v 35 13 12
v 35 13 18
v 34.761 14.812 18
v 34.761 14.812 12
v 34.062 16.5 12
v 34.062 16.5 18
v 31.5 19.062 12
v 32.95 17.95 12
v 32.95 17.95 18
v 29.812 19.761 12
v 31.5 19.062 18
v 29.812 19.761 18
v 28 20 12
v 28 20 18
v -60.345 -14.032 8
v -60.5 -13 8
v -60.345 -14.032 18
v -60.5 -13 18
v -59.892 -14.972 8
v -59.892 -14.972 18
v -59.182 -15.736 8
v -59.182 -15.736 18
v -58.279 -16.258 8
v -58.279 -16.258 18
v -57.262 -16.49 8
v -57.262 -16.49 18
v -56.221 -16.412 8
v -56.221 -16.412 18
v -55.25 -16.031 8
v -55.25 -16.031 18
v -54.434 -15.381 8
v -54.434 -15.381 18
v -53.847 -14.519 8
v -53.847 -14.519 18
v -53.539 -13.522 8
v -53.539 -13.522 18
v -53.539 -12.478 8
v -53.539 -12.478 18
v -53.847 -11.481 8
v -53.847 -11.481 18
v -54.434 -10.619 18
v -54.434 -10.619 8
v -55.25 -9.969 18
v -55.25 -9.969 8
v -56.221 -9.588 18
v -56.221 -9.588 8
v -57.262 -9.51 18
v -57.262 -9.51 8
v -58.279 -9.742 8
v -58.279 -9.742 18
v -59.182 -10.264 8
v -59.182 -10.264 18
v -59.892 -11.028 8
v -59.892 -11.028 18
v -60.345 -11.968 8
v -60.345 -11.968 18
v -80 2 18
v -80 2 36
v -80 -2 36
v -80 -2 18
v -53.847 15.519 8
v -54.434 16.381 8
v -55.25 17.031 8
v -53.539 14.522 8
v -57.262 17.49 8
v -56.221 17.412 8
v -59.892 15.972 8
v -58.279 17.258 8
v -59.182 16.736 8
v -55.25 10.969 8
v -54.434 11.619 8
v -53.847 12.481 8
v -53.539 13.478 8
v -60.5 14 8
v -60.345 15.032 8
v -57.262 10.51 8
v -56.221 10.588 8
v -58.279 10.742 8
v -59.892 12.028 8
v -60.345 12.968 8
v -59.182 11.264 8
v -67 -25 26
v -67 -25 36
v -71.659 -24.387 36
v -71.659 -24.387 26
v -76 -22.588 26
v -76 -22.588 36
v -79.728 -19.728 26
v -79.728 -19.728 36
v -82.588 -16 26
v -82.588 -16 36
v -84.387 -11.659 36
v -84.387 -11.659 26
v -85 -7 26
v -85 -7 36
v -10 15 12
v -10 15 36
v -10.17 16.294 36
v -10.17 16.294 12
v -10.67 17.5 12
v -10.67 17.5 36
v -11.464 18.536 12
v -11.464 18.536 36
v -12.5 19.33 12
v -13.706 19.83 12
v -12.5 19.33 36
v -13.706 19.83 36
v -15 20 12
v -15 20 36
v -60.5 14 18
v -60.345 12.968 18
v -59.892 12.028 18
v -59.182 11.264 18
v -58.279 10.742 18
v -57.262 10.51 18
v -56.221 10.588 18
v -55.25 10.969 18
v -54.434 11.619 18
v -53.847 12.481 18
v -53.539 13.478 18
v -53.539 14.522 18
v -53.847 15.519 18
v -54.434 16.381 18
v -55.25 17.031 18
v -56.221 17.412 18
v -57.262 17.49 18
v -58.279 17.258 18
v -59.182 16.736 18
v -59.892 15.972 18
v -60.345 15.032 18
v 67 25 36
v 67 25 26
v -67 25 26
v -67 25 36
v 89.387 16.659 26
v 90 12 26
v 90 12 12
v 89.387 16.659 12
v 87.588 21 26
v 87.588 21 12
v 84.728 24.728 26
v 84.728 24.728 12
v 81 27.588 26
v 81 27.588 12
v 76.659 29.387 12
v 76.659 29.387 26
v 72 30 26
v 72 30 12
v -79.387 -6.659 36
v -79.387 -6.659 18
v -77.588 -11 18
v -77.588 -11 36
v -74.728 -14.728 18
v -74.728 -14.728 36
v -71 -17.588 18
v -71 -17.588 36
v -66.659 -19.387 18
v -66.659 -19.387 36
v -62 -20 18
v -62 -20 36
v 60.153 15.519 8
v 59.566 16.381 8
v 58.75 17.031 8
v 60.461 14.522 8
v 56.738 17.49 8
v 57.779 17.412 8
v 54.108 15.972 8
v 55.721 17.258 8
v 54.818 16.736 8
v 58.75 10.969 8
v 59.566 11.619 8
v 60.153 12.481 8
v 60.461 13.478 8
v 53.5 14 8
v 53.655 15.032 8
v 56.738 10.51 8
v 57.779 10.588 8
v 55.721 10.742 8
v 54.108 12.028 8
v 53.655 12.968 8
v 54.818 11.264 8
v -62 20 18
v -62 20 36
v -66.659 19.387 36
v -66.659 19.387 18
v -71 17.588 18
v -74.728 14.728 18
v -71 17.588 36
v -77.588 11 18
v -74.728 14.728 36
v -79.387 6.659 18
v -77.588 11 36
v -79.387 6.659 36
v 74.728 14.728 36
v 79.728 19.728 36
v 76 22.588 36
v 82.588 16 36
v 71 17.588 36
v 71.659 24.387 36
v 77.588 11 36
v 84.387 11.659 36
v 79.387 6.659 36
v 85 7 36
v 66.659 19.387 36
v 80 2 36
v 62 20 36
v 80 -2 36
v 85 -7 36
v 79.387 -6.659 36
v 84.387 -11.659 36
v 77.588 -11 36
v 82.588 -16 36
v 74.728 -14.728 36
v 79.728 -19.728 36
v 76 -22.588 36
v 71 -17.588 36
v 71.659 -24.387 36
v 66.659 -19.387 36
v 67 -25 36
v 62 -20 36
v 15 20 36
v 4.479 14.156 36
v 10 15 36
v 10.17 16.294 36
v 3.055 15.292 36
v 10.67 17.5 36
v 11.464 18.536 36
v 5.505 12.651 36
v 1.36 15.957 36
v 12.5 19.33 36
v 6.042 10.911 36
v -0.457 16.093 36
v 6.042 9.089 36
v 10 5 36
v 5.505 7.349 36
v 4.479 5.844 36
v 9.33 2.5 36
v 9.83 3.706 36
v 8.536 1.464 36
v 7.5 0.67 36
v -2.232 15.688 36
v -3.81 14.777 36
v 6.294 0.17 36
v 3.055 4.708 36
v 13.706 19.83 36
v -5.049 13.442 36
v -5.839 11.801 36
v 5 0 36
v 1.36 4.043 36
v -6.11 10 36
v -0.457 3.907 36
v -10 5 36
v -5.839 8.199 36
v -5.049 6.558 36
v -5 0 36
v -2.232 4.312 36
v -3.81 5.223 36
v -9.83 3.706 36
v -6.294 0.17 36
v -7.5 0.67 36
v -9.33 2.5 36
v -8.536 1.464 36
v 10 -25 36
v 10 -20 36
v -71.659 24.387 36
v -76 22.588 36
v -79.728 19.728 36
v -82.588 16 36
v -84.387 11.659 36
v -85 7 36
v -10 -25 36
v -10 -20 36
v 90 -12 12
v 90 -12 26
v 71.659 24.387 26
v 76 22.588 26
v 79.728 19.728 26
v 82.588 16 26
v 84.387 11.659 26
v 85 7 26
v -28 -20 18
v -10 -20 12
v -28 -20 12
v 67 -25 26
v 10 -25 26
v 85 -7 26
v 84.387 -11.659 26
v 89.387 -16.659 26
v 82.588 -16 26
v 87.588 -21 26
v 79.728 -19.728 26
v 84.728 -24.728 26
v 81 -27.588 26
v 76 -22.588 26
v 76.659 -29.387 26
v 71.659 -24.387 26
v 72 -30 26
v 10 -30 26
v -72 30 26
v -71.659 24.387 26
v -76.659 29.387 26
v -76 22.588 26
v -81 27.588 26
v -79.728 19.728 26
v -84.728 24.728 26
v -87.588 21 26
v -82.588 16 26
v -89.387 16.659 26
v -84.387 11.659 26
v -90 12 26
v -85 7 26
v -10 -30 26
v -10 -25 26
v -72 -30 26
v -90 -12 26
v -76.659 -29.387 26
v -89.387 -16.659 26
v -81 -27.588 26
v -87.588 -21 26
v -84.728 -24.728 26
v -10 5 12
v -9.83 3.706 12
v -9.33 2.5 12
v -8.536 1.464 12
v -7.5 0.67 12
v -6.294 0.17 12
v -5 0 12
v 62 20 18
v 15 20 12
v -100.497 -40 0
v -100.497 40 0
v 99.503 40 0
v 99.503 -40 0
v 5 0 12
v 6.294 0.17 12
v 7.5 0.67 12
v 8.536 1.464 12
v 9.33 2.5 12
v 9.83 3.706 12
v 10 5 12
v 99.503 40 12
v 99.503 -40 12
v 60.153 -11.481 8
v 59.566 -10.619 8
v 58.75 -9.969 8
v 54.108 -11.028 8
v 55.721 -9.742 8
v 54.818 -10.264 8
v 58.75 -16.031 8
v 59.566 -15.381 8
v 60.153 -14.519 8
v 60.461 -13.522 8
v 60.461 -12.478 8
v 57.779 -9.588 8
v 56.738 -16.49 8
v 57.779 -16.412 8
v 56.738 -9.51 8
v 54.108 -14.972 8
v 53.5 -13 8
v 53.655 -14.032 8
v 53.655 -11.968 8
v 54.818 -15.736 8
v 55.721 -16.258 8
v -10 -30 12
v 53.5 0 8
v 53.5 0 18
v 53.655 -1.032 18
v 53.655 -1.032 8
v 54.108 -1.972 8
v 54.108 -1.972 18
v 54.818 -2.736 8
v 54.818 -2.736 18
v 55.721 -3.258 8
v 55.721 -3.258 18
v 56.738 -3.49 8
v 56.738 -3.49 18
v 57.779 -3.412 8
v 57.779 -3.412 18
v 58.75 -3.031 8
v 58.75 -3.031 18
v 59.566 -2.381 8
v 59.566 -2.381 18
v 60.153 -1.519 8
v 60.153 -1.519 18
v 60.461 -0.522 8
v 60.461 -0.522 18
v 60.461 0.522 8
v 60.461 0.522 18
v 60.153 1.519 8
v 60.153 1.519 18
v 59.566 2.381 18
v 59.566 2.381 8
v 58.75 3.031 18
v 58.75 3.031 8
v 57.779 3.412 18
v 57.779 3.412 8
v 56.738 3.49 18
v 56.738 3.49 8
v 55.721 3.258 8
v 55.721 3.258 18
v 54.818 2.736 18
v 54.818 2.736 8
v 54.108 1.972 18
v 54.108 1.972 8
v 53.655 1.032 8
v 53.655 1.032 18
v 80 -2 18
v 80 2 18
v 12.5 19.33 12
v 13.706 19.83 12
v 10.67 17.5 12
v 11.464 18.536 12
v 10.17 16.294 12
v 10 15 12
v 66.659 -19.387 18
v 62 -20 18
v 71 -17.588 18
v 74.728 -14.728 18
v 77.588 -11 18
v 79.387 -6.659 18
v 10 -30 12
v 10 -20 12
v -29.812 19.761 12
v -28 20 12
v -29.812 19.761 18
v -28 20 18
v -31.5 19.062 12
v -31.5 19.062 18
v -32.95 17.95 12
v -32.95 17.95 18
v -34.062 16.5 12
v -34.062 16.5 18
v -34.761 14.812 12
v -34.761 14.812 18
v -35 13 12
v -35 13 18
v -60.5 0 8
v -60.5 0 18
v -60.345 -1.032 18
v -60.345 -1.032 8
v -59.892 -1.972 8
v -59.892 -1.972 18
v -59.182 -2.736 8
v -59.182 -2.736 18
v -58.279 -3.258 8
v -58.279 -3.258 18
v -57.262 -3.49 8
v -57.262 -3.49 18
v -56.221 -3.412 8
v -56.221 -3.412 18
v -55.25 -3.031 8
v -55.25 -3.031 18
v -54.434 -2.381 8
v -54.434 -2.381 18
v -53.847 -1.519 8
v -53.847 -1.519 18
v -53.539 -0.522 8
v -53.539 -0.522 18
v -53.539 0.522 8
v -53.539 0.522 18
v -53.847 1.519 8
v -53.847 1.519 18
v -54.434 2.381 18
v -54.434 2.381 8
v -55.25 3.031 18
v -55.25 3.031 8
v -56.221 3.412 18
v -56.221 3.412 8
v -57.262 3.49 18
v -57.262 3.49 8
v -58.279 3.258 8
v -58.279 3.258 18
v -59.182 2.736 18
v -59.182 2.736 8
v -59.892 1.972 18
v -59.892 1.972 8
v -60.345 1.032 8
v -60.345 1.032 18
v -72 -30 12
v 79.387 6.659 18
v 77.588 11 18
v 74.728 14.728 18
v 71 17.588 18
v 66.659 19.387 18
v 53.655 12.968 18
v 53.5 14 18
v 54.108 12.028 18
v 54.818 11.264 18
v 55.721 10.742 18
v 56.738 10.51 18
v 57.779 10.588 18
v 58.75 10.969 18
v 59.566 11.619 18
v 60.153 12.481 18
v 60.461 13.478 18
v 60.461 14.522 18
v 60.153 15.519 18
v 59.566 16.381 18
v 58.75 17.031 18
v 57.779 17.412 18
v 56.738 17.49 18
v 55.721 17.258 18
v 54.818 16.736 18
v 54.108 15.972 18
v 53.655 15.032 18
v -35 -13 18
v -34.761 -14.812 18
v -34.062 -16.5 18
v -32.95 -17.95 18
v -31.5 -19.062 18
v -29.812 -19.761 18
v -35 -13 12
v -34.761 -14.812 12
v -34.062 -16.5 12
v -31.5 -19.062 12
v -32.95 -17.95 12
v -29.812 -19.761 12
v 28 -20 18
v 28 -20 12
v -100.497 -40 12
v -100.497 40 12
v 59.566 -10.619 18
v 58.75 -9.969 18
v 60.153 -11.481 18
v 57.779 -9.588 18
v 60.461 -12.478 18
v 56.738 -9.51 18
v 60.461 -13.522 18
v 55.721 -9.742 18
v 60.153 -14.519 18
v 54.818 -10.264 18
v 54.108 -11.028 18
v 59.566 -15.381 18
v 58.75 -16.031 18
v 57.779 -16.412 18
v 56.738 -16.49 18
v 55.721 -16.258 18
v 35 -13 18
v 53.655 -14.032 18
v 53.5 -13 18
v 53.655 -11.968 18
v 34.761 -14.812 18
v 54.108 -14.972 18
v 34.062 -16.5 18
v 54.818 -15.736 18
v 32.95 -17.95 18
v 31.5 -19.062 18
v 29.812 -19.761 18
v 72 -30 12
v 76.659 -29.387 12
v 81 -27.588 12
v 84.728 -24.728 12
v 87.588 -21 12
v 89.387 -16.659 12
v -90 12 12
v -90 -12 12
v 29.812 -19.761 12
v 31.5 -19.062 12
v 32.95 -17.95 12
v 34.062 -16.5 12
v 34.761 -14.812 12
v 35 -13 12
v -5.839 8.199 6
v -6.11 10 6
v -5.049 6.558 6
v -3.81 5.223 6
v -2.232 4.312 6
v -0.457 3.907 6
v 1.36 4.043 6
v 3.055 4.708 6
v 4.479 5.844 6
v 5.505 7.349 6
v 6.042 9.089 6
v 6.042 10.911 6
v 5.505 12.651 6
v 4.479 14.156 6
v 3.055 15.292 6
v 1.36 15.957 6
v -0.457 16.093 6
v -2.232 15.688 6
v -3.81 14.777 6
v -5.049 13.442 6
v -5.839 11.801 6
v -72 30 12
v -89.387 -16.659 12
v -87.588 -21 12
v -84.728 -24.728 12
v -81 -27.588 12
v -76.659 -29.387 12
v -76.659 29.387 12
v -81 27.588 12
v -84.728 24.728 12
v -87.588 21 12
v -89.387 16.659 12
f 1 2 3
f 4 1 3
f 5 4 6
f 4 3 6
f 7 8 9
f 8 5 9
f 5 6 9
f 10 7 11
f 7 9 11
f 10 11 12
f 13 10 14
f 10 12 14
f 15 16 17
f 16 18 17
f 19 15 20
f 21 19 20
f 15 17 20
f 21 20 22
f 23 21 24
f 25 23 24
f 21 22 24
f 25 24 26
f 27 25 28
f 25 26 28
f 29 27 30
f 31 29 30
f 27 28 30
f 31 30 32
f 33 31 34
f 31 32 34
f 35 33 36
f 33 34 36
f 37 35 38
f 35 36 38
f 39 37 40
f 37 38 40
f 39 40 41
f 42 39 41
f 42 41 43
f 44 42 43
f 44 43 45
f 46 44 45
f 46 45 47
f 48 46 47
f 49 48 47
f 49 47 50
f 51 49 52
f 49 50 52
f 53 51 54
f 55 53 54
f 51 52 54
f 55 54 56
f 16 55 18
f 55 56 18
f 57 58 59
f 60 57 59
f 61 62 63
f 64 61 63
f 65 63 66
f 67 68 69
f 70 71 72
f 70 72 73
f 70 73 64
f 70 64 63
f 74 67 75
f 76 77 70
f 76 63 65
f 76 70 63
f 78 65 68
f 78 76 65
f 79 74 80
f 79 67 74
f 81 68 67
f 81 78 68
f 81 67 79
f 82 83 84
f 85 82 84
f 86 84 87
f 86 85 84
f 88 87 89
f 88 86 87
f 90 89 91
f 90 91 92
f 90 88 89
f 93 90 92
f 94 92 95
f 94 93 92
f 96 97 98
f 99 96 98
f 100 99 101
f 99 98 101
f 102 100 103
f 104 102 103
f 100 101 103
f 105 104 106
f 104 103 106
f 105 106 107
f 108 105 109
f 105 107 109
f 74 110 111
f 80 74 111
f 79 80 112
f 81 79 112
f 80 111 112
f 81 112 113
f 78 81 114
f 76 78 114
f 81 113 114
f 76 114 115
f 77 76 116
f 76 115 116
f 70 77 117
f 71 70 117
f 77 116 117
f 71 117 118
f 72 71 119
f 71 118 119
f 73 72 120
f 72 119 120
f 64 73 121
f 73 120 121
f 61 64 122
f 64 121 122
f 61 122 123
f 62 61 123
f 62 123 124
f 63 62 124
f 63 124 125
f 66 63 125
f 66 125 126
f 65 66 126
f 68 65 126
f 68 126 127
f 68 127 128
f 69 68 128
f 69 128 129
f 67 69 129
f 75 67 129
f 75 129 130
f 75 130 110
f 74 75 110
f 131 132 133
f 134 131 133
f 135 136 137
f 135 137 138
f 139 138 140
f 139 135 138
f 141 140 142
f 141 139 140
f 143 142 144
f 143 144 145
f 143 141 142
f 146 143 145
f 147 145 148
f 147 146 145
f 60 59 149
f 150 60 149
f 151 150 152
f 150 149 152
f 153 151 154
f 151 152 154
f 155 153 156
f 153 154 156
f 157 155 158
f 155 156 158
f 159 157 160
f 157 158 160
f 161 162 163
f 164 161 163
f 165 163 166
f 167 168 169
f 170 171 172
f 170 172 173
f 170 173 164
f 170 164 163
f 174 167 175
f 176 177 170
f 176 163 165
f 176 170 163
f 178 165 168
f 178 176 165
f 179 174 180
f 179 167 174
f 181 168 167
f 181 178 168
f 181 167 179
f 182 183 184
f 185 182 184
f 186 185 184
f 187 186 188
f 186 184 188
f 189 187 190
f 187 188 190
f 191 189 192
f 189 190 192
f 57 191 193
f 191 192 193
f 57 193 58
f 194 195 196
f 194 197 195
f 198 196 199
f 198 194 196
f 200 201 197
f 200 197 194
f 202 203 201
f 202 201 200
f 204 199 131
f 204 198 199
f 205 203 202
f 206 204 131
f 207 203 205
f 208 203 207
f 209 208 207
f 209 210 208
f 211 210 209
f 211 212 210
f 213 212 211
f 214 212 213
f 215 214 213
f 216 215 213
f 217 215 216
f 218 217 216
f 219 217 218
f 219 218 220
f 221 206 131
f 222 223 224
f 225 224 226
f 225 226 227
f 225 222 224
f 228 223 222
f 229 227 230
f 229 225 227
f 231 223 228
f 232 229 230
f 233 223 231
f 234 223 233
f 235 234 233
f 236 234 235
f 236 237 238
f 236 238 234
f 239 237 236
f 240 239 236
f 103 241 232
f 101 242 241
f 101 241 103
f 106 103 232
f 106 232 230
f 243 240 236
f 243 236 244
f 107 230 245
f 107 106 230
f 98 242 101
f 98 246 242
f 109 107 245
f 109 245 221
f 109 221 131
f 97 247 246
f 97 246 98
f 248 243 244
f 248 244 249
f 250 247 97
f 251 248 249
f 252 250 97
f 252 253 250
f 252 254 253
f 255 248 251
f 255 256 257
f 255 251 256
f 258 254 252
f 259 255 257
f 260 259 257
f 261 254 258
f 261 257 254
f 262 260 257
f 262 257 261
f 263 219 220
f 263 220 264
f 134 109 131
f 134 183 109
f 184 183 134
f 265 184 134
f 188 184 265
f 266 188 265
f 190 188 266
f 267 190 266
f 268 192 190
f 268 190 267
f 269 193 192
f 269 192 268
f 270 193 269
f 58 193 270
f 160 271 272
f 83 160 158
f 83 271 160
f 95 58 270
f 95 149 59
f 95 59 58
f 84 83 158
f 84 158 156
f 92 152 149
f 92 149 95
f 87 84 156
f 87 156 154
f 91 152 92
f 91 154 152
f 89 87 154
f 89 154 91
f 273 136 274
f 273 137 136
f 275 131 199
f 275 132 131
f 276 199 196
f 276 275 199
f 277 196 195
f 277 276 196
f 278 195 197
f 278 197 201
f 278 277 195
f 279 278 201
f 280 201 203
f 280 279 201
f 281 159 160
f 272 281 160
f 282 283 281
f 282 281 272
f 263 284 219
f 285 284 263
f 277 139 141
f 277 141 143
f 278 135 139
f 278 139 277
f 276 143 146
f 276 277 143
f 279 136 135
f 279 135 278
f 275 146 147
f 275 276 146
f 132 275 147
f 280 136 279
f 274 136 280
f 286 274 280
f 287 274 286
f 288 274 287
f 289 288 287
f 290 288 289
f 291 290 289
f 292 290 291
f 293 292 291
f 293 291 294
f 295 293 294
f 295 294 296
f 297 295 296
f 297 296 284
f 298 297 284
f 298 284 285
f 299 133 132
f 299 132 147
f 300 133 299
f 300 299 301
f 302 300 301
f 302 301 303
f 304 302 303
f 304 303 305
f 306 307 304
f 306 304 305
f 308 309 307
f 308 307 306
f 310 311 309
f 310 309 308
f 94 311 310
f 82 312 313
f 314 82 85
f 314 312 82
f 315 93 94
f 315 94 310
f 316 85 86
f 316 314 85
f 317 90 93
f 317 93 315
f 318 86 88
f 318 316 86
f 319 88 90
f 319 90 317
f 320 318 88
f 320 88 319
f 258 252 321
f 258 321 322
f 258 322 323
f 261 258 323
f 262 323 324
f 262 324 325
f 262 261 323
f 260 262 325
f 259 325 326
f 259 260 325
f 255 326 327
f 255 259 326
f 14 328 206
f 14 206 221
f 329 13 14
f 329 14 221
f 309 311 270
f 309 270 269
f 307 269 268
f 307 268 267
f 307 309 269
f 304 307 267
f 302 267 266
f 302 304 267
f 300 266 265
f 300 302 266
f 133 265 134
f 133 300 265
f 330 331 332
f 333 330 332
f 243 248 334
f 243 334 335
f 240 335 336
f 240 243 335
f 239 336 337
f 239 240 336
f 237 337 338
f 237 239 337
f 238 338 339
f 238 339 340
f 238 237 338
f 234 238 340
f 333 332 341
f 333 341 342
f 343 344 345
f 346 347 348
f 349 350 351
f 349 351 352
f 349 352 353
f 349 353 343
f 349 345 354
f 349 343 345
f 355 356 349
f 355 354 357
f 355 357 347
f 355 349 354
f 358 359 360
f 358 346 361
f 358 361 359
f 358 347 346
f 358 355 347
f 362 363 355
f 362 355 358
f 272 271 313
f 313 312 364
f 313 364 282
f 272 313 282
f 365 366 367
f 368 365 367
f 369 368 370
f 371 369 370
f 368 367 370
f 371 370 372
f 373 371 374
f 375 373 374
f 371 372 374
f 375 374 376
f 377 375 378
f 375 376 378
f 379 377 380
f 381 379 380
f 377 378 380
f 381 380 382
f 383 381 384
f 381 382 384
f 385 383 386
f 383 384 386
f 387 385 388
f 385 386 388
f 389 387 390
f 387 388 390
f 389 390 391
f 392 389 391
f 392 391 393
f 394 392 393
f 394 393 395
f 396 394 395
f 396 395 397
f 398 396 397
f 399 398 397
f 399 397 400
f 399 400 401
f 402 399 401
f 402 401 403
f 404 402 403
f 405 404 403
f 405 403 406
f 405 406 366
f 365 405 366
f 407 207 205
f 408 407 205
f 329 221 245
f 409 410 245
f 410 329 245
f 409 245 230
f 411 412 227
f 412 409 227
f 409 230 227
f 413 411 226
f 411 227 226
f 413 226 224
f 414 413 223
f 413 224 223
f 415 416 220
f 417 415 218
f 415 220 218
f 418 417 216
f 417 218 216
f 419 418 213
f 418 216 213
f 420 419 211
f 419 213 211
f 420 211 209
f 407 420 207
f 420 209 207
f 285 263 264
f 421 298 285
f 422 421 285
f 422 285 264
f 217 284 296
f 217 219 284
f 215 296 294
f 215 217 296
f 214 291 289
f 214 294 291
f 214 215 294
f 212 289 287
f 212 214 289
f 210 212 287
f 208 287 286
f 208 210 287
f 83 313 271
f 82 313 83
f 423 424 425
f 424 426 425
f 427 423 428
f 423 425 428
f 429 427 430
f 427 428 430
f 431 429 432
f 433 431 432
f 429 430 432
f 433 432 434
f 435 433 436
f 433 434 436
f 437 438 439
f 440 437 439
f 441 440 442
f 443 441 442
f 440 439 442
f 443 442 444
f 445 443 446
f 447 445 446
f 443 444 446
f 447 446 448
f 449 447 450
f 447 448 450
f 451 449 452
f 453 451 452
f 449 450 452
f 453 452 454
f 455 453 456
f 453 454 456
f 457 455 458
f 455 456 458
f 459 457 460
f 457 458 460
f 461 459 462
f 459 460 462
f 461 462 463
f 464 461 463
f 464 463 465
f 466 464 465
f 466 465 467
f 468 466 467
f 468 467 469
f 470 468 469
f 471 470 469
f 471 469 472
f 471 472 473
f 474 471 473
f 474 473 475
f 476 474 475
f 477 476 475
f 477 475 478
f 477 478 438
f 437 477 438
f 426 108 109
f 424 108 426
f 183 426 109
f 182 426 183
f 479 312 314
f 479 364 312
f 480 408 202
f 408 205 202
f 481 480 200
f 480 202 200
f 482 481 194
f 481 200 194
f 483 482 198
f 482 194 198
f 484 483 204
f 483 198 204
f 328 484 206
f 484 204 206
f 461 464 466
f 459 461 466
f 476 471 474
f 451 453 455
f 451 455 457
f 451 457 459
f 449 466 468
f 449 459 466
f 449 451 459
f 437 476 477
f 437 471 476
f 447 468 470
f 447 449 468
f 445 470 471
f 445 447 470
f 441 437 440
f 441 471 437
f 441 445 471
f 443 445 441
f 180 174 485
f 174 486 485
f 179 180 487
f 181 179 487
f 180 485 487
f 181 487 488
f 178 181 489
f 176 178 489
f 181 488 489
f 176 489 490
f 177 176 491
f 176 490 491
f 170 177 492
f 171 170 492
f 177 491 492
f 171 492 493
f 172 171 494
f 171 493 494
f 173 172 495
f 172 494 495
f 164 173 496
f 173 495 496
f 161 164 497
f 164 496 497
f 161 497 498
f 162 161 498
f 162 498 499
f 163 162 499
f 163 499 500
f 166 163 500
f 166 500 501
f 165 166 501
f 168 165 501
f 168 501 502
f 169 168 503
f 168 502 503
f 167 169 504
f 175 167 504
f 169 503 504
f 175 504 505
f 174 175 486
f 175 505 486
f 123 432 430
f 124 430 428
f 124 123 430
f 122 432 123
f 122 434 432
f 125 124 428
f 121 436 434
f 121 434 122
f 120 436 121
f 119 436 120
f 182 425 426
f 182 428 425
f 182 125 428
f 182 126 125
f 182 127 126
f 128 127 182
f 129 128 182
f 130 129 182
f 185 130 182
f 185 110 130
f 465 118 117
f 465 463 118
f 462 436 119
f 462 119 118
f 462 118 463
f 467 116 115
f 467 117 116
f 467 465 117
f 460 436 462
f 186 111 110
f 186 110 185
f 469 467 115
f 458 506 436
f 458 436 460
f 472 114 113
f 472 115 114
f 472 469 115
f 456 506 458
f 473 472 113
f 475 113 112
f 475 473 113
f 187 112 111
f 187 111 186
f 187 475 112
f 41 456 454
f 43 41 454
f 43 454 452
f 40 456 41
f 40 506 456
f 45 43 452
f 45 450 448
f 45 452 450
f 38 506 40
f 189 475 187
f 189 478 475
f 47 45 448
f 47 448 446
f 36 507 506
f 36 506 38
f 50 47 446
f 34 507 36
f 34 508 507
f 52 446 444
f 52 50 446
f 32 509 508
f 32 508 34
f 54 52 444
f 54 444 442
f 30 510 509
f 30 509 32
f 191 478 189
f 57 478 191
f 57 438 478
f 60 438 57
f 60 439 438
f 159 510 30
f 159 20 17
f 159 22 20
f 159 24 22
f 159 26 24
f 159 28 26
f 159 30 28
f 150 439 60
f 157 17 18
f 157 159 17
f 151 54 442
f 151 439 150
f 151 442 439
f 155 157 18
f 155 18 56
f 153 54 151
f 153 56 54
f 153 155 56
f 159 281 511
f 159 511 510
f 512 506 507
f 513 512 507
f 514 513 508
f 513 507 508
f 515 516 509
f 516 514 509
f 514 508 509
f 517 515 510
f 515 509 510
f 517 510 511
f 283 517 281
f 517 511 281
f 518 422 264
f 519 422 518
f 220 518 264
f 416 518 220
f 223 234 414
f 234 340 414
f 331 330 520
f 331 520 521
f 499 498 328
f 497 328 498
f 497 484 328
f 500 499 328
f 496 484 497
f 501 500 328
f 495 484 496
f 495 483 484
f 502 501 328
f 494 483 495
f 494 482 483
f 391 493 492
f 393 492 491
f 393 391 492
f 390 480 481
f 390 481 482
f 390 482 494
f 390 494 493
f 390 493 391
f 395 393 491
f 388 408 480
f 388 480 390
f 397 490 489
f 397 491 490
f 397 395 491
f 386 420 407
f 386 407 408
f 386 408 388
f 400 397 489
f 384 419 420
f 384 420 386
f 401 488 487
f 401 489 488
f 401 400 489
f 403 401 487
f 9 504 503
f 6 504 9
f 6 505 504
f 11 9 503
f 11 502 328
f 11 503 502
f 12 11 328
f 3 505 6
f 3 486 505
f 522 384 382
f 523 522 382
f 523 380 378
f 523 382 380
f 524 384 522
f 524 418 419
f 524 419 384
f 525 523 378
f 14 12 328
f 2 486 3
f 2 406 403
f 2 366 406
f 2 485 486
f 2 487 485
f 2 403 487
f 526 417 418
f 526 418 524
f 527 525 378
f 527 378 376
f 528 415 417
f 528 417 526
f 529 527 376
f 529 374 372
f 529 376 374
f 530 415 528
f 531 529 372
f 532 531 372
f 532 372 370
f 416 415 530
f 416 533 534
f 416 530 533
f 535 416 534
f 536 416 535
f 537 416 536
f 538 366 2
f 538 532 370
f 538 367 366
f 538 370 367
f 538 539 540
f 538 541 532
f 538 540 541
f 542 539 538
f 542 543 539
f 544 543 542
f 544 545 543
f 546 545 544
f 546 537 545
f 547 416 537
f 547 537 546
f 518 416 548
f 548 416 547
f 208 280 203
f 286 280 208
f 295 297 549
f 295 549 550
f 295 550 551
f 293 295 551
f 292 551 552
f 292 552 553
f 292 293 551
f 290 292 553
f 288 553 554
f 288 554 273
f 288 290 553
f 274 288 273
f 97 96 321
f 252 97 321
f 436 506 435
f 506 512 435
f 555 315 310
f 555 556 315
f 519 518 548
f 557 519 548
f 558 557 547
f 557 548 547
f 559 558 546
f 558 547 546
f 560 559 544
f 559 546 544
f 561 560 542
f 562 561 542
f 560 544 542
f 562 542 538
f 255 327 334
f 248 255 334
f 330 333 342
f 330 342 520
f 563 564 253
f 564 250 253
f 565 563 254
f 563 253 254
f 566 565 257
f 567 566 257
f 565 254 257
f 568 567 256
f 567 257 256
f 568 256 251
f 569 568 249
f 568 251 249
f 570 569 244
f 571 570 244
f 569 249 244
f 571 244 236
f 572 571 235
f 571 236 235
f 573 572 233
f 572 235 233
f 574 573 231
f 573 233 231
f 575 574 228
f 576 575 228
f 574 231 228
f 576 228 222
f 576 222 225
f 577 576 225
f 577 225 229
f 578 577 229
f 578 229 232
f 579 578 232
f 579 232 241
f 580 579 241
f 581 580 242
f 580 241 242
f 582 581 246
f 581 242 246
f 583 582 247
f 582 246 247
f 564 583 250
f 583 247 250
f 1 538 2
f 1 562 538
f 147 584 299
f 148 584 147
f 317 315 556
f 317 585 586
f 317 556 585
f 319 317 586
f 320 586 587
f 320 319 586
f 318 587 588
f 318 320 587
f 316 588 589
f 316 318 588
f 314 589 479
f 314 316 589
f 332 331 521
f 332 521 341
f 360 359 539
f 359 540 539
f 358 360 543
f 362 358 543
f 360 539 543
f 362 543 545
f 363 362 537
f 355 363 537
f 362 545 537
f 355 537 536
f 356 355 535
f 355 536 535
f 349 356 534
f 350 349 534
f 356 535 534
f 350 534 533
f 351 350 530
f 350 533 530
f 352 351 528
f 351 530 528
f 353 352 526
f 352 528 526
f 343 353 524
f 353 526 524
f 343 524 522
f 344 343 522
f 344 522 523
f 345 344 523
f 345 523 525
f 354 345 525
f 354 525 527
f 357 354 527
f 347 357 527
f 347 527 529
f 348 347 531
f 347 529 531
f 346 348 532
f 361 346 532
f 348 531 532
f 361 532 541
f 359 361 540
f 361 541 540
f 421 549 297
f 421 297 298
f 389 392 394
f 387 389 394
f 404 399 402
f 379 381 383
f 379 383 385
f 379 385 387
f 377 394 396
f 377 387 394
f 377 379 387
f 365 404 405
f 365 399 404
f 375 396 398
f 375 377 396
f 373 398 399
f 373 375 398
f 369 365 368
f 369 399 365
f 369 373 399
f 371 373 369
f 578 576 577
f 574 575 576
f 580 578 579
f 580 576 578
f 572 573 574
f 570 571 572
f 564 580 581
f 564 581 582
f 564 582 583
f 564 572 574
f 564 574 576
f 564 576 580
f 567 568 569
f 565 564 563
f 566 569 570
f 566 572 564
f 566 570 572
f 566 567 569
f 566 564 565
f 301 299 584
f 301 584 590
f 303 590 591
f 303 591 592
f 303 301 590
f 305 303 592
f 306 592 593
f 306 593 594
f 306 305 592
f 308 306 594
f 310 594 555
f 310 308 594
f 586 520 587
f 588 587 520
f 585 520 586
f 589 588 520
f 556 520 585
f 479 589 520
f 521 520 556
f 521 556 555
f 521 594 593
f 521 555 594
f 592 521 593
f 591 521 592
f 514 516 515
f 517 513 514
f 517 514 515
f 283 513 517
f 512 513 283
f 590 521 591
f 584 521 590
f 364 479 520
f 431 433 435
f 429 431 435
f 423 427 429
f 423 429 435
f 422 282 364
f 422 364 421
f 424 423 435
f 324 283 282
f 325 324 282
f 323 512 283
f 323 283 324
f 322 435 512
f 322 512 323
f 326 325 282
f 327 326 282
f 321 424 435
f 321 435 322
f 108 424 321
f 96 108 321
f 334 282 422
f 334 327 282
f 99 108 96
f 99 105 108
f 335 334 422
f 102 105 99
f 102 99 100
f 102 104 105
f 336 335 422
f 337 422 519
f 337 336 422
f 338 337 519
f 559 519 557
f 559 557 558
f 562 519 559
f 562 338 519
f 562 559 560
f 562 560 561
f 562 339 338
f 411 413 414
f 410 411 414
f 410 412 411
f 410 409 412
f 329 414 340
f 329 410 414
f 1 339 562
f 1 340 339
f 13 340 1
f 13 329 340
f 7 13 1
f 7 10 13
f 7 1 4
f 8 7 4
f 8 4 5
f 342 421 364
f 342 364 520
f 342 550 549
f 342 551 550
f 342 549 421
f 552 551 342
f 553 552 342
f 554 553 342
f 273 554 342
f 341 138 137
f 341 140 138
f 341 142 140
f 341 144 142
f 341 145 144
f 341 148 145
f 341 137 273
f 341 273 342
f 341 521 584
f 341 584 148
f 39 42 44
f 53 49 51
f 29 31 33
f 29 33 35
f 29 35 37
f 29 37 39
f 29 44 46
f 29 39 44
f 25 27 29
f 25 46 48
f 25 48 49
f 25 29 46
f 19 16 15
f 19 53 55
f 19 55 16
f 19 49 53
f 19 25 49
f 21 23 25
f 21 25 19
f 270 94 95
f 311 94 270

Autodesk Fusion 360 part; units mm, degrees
sketch "Sketch1" plane through (0, 0, 0) normal (0, 0, 1) x (1, 0, 0)
  line L0 (99.503, -40) -> (-100.497, -40)
  line L1 (-100.497, -40) -> (-100.497, 40)
  line L2 (-100.497, 40) -> (99.503, 40)
  line L3 (99.503, 40) -> (99.503, -40)
  line L4 (99.503, -40) -> (-100.497, 40) construction
  line L5 (-100.497, -40) -> (99.503, 40) construction
  point P0 (-0.497, 0)
  dimension "d1" = 200
  dimension "d2" = 80
extrude "Extrude1" add sketch "Sketch1" along normal blind 12
sketch "Sketch2" plane through (0, 0, 12) normal (0, 0, 1) x (-1, 0, 0)
  line L0 (-99.503, -40) -> (100.497, -40)
  line L1 (100.497, -40) -> (100.497, 40)
  line L2 (100.497, 40) -> (-99.503, 40)
  line L3 (-99.503, 40) -> (-99.503, -40)
  line L4 (90, -30) -> (-90, -30)
  line L5 (-90, -30) -> (-90, 30)
  line L6 (-90, 30) -> (-10, 30)
  line L7 (-10, 30) -> (-10, 20)
  line L8 (-10, 20) -> (-80, 20)
  line L9 (-80, 20) -> (-80, -20)
  line L10 (-80, -20) -> (80, -20)
  line L11 (80, -20) -> (80, 20)
  line L12 (80, 20) -> (10, 20)
  line L13 (10, 30) -> (10, 20)
  line L14 (10, 30) -> (90, 30)
  line L15 (90, 30) -> (90, -30)
  line L16 (10, 25) -> (85, 25)
  line L17 (85, 25) -> (85, -25)
  line L18 (85, -25) -> (10, -25)
  line L19 (10, -25) -> (10, 0)
  line L20 (10, 0) -> (-10, 0)
  line L21 (-10, 0) -> (-10, -25)
  line L22 (-10, -25) -> (-85, -25)
  line L23 (-85, -25) -> (-85, 25)
  line L24 (-85, 25) -> (-10, 25)
  line L25 (10, -25) -> (-10, -25)
extrude "Extrude2" add sketch "Sketch2" along normal blind 15 contours L10 L11 L12 L13 L16 L17 L18 L19 | L7 L8 L9 L10 L21 L22 L23 L24 | L10 L19 L21 L25 | L10 L19 L20 L21
sketch "Sketch3" plane through (0, 0, 12) normal (0, 0, 1) x (-1, 0, 0)
  line L0 (10, 25) -> (85, 25)
  line L1 (85, 25) -> (85, -25)
  line L2 (85, -25) -> (-85, -25)
  line L3 (-85, -25) -> (-85, 25)
  line L4 (-85, 25) -> (-10, 25)
  line L5 (-10, 25) -> (-10, 20)
  line L6 (-10, 20) -> (-80, 20)
  line L7 (-80, 20) -> (-80, -20)
  line L8 (-80, -20) -> (-10, -20)
  line L9 (-10, -20) -> (-10, 0)
  line L10 (-10, 0) -> (10, 0)
  line L11 (10, 0) -> (10, -20)
  line L12 (10, -20) -> (80, -20)
  line L13 (80, -20) -> (80, 20)
  line L14 (80, 20) -> (10, 20)
  line L15 (10, 20) -> (10, 25)
  line L16 (-99.503, -40) -> (100.497, -40)
  line L17 (100.497, -40) -> (100.497, 40)
  line L18 (100.497, 40) -> (-99.503, 40)
  line L19 (-99.503, 40) -> (-99.503, -40)
  line L20 (90, -30) -> (-90, -30)
  line L21 (-90, -30) -> (-90, 30)
  line L22 (-90, 30) -> (-10, 30)
  line L23 (-10, 30) -> (-10, 25)
  line L24 (10, 25) -> (10, 30)
  line L25 (10, 30) -> (90, 30)
  line L26 (90, 30) -> (90, -30)
extrude "Extrude3" add sketch "Sketch3" along normal blind 14 contours L0 L1 L2 L3 L4 L20 L21 L22 L23 L24 L25 L26
extrude "Extrude4" add 1 faces at (3.3333, 6.6667, 27) along direction (0, 0, 1) blind 9
fillet "Fillet1" radius 5 2 edges at (-10, 0, 24) (10, 0, 24)
fillet "Fillet2" radius 5 2 edges at (10, 20, 24) (-10, 20, 24)
fillet "Fillet3" radius 18 12 edges at (-85, -25, 31) (-90, -30, 19) (85, -25, 31) (90, -30, 19) (90, 30, 19) (85, 25, 31) (-90, 30, 19) (-85, 25, 31) (-80, 20, 24) (80, 20, 24) (-80, -20, 24) (80, -20, 24)
sketch "Sketch4" plane through (0, 0, 36) normal (0, 0, 1) x (-1, 0, 0)
  arc A0 (67, -25) -> (85, -7) centre (67, -7) ccw
  line L0 (85, -7) -> (85, 7)
  arc A1 (85, 7) -> (67, 25) centre (67, 7) ccw
  line L1 (67, 25) -> (10, 25)
  line L2 (10, 25) -> (10, 20)
  line L3 (10, 20) -> (62, 20)
  arc A2 (80, 2) -> (62, 20) centre (62, 2) ccw
  line L4 (80, 2) -> (80, -2)
  arc A3 (62, -20) -> (80, -2) centre (62, -2) ccw
  line L5 (62, -20) -> (15, -20)
  arc A4 (10, -15) -> (15, -20) centre (15, -15) ccw
  line L6 (10, -15) -> (10, -5)
  arc A5 (10, -5) -> (5, 0) centre (5, -5) ccw
  line L7 (5, 0) -> (-5, 0)
  arc A6 (-5, 0) -> (-10, -5) centre (-5, -5) ccw
  line L8 (-10, -5) -> (-10, -15)
  arc A7 (-15, -20) -> (-10, -15) centre (-15, -15) ccw
  line L9 (-15, -20) -> (-62, -20)
  arc A8 (-80, -2) -> (-62, -20) centre (-62, -2) ccw
  line L10 (-80, -2) -> (-80, 2)
  arc A9 (-62, 20) -> (-80, 2) centre (-62, 2) ccw
  line L11 (-62, 20) -> (-10, 20)
  line L12 (-10, 20) -> (-10, 25)
  line L13 (-10, 25) -> (-67, 25)
  arc A10 (-67, 25) -> (-85, 7) centre (-67, 7) ccw
  line L14 (-85, 7) -> (-85, -7)
  arc A11 (-85, -7) -> (-67, -25) centre (-67, -7) ccw
  line L15 (-67, -25) -> (67, -25)
  circle A12 centre (0, -10) radius 6.1104
extrude "Extrude5" cut sketch "Sketch4" against normal blind 30 contours A12
sketch "Sketch5" plane through (0, 0, 12) normal (0, 0, 1) x (-1, 0, 0)
  arc A0 (-62, 20) -> (-80, 2) centre (-62, 2) ccw
  line L0 (-80, 2) -> (-80, -2)
  arc A1 (-80, -2) -> (-62, -20) centre (-62, -2) ccw
  line L1 (-62, -20) -> (-15, -20)
  arc A2 (-15, -20) -> (-10, -15) centre (-15, -15) ccw
  line L2 (-10, -15) -> (-10, -5)
  arc A3 (-5, 0) -> (-10, -5) centre (-5, -5) ccw
  line L3 (-5, 0) -> (5, 0)
  arc A4 (10, -5) -> (5, 0) centre (5, -5) ccw
  line L4 (10, -5) -> (10, -15)
  arc A5 (10, -15) -> (15, -20) centre (15, -15) ccw
  line L5 (15, -20) -> (62, -20)
  arc A6 (62, -20) -> (80, -2) centre (62, -2) ccw
  line L6 (80, -2) -> (80, 2)
  arc A7 (80, 2) -> (62, 20) centre (62, 2) ccw
  line L7 (62, 20) -> (10, 20)
  line L8 (10, 20) -> (10, 30)
  line L9 (10, 30) -> (72, 30)
  arc A8 (90, 12) -> (72, 30) centre (72, 12) ccw
  line L10 (90, 12) -> (90, -12)
  arc A9 (72, -30) -> (90, -12) centre (72, -12) ccw
  line L11 (72, -30) -> (-72, -30)
  arc A10 (-90, -12) -> (-72, -30) centre (-72, -12) ccw
  line L12 (-90, -12) -> (-90, 12)
  arc A11 (-72, 30) -> (-90, 12) centre (-72, 12) ccw
  line L13 (-72, 30) -> (-10, 30)
  line L14 (-10, 30) -> (-10, 20)
  line L15 (-10, 20) -> (-62, 20)
  line L16 (-99.503, -40) -> (100.497, -40)
  line L17 (100.497, -40) -> (100.497, 40)
  line L18 (100.497, 40) -> (-99.503, 40)
  line L19 (-99.503, 40) -> (-99.503, -40)
  line L20 (35, 20) -> (35, -20)
  line L21 (-35, 20) -> (-35, -20)
extrude "Extrude6" add sketch "Sketch5" along normal blind 6 contours A0 L0 A1 L1 L15 L21 | L5 A6 L6 A7 L7 L20
fillet "Fillet4" radius 7 4 edges at (-35, 20, 15) (35, 20, 15) (35, -20, 15) (-35, -20, 15)
sketch "Sketch6" plane through (0, 0, 18) normal (0, 0, 1) x (-1, 0, 0)
  line L0 (35, 13) -> (35, -13)
  arc A0 (28, -20) -> (35, -13) centre (28, -13) ccw
  line L1 (28, -20) -> (62, -20)
  arc A1 (62, -20) -> (80, -2) centre (62, -2) ccw
  line L2 (80, -2) -> (80, 2)
  arc A2 (80, 2) -> (62, 20) centre (62, 2) ccw
  line L3 (62, 20) -> (28, 20)
  arc A3 (35, 13) -> (28, 20) centre (28, 13) ccw
  circle A4 centre (57, 0) radius 3.5
  circle A5 centre (57, 13) radius 3.5
  circle A6 centre (57, -14) radius 3.5
  dimension "d23" = 7
  dimension "d24" = 7
  dimension "d25" = 7
sketch "Sketch7" plane through (0, 0, 18) normal (0, 0, 1) x (-1, 0, 0)
  arc A0 (-62, 20) -> (-80, 2) centre (-62, 2) ccw
  line L0 (-80, 2) -> (-80, -2)
  arc A1 (-80, -2) -> (-62, -20) centre (-62, -2) ccw
  line L1 (-62, -20) -> (-28, -20)
  arc A2 (-35, -13) -> (-28, -20) centre (-28, -13) ccw
  line L2 (-35, -13) -> (-35, 13)
  arc A3 (-28, 20) -> (-35, 13) centre (-28, 13) ccw
  line L3 (-28, 20) -> (-62, 20)
  circle A4 centre (-57, 0) radius 3.5
  circle A5 centre (-57, -14) radius 3.5
  circle A6 centre (-57, 13) radius 3.5
  dimension "d26" = 7
  dimension "d27" = 7
  dimension "d28" = 7
extrude "Extrude7" cut sketch "Sketch7" sketch "Sketch6" against normal blind 10 contours A4 | A5 | A6 of sketch 2 contours A4 | A5 | A6
